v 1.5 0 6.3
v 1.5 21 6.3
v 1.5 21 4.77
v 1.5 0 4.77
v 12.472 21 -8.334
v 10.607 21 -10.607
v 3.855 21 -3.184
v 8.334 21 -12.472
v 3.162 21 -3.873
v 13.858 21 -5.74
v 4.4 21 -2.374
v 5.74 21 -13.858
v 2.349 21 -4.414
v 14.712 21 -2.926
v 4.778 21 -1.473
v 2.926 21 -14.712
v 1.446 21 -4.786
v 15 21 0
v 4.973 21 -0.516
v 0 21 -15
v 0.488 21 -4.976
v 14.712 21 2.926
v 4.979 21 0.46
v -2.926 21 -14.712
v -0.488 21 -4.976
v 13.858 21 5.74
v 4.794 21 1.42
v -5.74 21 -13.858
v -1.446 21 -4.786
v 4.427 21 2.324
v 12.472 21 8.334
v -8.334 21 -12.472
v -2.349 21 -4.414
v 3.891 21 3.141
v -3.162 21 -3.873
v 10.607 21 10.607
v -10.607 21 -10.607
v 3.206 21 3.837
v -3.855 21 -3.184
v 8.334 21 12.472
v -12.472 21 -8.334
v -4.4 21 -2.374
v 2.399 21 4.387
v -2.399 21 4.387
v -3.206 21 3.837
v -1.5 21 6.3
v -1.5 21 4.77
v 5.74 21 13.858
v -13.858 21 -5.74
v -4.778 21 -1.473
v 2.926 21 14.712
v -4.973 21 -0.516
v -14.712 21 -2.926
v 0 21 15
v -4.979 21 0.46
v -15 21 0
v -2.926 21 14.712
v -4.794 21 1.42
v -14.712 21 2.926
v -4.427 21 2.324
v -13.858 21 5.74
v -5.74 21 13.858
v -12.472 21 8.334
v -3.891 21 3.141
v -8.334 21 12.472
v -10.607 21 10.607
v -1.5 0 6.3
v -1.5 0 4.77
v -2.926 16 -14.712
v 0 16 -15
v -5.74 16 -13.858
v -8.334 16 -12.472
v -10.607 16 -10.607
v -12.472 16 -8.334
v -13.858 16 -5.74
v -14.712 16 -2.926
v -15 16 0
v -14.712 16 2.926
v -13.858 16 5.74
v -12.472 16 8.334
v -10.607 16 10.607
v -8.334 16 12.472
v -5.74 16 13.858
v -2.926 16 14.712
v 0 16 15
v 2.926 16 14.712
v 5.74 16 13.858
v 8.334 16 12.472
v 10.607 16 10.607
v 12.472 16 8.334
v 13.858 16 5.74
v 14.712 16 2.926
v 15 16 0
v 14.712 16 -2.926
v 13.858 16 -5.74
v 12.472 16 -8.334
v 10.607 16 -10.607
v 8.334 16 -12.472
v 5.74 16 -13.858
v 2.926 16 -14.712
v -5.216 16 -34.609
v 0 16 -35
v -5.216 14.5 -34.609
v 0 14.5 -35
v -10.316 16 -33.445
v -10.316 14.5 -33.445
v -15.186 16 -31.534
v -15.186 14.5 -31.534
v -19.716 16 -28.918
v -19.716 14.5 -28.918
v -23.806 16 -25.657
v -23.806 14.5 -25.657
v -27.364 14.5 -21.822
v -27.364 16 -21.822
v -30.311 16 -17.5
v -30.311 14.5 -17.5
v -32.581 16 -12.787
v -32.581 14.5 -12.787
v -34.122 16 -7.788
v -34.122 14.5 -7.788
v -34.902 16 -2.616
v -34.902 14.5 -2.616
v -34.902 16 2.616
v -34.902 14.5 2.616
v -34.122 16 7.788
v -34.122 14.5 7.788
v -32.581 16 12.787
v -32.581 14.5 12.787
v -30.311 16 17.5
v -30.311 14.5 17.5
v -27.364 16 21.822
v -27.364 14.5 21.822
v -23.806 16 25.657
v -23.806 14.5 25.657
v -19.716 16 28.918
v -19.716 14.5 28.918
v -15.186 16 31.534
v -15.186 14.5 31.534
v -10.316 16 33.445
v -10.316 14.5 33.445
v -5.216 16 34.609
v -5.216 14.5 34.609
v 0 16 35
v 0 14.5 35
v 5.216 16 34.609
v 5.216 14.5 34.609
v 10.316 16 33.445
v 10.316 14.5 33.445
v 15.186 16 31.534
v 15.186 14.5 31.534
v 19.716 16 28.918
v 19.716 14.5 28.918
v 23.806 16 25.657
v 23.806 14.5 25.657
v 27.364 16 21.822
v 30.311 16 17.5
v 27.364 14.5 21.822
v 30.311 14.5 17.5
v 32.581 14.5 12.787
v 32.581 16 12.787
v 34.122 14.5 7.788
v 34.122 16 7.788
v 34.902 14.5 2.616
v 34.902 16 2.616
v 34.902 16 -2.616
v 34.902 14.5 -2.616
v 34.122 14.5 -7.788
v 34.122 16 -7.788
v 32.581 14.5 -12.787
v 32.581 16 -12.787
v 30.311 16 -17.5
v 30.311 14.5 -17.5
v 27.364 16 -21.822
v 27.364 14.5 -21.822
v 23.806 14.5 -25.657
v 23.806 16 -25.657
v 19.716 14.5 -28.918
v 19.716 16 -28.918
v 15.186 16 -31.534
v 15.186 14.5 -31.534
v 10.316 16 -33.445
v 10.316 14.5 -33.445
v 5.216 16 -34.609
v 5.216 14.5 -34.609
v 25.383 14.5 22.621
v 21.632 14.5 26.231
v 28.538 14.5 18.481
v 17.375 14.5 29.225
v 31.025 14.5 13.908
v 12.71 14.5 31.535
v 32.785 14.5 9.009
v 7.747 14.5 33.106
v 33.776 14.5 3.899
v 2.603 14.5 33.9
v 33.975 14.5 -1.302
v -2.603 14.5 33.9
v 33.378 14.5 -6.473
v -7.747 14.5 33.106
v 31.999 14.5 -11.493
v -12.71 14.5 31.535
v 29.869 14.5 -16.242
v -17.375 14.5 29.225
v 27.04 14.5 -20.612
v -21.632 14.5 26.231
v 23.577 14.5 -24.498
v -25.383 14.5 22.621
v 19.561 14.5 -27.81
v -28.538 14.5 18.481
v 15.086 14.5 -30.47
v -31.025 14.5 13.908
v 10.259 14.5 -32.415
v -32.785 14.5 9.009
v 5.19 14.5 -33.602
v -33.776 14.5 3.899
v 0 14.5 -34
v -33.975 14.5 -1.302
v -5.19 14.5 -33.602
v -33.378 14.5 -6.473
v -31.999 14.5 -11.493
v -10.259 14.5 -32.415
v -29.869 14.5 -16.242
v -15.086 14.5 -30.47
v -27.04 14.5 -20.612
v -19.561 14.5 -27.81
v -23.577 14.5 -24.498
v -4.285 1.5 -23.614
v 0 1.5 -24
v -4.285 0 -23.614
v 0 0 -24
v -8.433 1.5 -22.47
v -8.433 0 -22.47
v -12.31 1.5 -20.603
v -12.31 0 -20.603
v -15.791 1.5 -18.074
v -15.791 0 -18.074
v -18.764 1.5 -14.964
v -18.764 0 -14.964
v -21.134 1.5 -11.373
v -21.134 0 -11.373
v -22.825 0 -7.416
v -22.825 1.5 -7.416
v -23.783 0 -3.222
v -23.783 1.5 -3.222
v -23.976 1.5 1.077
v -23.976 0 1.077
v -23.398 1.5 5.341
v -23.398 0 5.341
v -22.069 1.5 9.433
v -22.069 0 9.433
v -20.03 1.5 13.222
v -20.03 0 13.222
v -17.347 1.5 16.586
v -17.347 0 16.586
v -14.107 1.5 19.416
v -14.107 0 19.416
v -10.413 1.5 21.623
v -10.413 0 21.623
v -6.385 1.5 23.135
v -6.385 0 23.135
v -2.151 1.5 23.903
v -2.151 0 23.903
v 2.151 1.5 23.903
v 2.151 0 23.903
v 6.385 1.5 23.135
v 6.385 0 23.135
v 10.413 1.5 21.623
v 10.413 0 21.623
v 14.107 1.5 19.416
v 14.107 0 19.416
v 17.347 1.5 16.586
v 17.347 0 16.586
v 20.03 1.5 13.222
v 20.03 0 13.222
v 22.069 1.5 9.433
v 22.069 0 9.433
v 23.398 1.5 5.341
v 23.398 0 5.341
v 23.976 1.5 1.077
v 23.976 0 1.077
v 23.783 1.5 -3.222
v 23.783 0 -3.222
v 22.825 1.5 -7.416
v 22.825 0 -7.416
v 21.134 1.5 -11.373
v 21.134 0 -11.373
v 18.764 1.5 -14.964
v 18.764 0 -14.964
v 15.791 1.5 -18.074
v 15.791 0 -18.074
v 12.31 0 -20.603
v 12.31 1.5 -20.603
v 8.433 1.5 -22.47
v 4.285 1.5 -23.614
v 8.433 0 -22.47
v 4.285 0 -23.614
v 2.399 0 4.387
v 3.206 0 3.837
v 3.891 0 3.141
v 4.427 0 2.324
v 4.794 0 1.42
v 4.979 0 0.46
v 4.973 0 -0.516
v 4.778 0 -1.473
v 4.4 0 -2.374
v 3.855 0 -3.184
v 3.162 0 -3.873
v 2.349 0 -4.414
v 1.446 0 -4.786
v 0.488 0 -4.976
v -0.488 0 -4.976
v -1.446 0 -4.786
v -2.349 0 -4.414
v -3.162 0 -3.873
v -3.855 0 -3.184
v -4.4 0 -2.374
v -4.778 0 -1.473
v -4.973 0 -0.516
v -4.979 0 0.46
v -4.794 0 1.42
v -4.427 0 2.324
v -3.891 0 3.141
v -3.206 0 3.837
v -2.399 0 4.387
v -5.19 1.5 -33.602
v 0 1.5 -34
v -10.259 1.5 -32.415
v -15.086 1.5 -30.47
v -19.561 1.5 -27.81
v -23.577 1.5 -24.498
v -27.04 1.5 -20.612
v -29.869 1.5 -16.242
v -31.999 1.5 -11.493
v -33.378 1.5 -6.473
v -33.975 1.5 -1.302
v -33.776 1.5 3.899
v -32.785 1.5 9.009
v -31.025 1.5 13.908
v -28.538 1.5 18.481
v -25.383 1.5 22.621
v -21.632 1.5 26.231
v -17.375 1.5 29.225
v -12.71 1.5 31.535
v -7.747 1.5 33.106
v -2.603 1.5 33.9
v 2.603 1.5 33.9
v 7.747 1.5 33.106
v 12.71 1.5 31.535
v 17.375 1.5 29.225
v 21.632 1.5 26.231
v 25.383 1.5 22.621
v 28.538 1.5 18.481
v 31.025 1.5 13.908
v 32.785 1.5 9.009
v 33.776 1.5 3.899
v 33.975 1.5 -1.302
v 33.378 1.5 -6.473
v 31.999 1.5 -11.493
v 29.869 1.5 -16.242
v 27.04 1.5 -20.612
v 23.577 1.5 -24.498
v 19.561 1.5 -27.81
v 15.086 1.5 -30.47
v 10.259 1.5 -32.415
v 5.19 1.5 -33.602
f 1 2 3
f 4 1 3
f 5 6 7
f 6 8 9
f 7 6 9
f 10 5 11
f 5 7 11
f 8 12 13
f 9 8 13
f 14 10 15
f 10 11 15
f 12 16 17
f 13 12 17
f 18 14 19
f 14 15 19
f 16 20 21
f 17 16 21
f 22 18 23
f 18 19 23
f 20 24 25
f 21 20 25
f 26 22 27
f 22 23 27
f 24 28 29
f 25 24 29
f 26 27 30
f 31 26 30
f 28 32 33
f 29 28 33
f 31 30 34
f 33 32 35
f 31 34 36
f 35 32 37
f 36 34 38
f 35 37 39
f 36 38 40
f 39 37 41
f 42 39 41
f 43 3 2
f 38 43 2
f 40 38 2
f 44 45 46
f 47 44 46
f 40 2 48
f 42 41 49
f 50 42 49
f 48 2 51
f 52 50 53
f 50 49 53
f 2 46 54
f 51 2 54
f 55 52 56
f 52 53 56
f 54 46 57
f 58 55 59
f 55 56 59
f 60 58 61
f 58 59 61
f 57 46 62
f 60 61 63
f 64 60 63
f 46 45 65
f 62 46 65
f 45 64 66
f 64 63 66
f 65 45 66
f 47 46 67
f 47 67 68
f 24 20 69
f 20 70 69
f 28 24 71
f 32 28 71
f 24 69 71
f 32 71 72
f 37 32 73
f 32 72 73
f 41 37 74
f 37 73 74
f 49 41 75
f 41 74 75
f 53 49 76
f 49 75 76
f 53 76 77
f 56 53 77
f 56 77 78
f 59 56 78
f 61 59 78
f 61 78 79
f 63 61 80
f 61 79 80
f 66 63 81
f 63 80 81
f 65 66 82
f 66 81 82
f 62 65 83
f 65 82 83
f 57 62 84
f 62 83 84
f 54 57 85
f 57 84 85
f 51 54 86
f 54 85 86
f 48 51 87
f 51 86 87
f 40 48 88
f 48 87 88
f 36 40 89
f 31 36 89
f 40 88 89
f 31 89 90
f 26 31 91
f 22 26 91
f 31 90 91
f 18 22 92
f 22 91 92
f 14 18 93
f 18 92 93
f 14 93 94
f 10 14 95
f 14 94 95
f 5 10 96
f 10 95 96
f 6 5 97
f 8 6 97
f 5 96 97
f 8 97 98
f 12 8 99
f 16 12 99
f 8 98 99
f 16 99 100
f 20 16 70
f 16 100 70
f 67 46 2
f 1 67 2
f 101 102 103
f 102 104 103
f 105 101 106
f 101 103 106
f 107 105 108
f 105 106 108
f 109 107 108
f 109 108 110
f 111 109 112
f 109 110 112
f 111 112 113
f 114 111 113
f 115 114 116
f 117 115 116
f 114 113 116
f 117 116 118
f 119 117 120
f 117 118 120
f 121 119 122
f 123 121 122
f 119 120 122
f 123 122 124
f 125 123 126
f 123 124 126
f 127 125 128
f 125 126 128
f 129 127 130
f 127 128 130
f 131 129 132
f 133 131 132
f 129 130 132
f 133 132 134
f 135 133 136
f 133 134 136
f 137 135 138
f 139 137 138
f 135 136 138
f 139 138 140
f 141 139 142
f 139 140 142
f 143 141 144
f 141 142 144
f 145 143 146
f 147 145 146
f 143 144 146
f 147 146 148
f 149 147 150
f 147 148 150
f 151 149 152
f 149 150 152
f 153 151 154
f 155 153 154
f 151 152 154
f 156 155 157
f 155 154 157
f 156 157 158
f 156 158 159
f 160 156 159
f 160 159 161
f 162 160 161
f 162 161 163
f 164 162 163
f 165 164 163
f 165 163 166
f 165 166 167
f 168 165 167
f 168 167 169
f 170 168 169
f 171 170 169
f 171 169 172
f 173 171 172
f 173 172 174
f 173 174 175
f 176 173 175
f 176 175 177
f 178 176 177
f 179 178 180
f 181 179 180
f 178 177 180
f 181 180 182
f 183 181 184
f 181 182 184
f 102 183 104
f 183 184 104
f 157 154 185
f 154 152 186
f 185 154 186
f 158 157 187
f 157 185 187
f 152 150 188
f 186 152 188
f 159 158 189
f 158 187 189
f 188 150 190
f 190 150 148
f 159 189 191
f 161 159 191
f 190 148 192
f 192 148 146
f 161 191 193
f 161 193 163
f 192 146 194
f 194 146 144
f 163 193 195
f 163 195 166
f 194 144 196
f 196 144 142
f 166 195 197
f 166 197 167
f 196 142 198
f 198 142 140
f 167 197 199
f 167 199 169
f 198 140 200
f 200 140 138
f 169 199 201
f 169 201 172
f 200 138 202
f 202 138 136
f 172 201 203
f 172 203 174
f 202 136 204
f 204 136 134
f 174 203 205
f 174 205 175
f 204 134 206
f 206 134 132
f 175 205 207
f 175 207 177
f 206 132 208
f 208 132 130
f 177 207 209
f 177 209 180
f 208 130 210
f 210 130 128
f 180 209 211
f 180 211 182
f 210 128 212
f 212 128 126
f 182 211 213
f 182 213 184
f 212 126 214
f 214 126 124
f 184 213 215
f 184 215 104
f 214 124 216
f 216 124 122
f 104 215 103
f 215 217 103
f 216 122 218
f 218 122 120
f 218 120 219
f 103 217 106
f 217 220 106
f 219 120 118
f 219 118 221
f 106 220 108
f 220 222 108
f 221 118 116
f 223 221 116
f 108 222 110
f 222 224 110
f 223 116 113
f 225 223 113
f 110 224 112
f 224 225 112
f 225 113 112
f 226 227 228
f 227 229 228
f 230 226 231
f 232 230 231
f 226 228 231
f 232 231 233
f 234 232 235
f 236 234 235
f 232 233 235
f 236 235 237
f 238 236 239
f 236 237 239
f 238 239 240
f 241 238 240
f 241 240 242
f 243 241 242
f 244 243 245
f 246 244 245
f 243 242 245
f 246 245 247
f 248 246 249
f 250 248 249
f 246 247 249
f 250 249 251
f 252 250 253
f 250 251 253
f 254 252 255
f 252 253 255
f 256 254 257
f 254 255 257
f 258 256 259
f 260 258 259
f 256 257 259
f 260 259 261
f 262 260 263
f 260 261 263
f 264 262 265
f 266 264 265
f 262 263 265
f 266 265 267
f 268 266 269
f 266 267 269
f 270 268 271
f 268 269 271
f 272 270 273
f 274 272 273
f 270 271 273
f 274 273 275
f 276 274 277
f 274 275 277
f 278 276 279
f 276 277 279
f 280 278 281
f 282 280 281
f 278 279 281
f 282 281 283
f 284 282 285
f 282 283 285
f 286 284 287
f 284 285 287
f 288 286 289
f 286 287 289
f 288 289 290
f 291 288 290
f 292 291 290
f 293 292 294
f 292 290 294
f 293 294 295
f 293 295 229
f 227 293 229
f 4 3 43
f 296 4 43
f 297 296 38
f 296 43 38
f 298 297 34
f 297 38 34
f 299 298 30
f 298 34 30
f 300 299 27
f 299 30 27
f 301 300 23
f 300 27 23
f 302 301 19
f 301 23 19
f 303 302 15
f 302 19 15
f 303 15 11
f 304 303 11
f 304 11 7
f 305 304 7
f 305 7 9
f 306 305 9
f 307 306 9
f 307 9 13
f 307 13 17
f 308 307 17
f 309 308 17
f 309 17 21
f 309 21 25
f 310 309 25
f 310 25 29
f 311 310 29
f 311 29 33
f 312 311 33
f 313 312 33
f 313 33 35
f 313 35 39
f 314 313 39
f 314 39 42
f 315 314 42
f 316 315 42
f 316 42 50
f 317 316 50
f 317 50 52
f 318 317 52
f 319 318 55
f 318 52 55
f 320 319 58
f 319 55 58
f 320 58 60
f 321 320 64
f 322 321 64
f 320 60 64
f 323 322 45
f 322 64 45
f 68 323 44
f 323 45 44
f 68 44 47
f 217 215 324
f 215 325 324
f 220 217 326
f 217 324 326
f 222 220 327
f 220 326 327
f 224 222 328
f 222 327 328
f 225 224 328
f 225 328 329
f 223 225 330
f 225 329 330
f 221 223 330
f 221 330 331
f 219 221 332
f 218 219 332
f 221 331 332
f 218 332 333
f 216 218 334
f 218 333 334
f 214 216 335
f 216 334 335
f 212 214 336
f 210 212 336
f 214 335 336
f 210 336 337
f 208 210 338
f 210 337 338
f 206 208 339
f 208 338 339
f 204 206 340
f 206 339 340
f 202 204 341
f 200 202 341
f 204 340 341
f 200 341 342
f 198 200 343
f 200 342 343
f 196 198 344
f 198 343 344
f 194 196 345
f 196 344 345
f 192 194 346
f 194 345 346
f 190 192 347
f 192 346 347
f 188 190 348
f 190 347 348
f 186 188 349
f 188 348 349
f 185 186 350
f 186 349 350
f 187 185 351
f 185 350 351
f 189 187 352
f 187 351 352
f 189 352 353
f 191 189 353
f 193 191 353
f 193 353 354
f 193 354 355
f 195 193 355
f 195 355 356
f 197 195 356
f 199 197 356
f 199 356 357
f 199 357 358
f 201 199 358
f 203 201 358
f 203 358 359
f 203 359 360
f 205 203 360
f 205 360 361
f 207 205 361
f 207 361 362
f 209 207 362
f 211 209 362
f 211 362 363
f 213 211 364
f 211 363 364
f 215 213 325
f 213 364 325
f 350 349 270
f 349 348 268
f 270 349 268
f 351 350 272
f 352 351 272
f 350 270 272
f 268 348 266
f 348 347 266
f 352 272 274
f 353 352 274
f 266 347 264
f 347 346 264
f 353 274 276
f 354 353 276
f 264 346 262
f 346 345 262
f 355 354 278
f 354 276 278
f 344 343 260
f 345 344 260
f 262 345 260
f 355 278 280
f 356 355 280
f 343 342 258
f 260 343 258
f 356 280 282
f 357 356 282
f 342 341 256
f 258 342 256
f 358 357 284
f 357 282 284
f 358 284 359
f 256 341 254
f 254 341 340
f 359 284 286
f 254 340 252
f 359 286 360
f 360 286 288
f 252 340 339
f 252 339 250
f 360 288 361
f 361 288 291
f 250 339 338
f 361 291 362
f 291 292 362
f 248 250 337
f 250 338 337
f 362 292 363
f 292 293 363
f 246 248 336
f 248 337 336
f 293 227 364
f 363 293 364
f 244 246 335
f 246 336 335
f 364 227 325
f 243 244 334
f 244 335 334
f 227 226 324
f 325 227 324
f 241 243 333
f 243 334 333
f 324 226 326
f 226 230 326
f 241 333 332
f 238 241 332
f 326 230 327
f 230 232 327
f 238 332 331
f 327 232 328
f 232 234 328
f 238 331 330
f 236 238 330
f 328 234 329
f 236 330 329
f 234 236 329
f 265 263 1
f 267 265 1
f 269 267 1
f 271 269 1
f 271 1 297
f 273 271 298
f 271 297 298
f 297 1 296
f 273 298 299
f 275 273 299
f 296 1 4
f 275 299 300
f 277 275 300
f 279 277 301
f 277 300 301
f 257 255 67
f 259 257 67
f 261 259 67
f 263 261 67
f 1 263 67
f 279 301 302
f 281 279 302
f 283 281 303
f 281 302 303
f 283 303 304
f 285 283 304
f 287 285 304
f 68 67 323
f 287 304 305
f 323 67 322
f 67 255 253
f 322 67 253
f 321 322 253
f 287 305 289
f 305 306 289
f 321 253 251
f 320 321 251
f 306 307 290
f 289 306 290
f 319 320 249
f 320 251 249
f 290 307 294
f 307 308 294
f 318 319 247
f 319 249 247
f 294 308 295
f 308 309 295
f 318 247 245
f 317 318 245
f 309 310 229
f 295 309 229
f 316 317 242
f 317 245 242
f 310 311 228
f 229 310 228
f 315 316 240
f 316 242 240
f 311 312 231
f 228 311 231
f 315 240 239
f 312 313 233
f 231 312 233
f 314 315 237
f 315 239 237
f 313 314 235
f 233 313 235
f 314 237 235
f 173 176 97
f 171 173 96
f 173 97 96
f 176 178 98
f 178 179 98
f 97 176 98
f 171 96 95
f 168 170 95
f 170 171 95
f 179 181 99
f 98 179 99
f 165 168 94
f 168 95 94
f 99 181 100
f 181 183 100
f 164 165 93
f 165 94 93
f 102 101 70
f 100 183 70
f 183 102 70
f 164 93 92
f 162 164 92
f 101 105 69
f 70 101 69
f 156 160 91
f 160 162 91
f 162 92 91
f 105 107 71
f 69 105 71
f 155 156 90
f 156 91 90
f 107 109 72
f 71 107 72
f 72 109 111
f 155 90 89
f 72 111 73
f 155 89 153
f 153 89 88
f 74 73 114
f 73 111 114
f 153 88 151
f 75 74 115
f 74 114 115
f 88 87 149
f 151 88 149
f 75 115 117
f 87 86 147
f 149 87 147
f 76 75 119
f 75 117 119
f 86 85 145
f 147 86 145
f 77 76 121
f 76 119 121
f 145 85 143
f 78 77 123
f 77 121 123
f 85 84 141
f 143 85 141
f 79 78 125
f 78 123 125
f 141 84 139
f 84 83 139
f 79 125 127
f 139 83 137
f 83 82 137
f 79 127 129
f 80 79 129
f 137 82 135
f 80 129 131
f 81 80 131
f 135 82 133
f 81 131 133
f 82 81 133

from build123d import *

# Parameters (mm, degrees)
SKETCH2_R          = 5
CUT_EXTRUDE1_DEPTH = 54.768020235
SKETCH3_W          = 3
SKETCH3_H          = 2
CUT_EXTRUDE2_DEPTH = 54.768020235


with BuildPart() as part:
    # Sketch1 → Revolve2 (revolve)
    with BuildSketch(Plane.XY, mode=Mode.PRIVATE) as revolve2_sk:
        Polygon((34, 14.5), (34, 1.5), (24, 1.5), (24, 0), (0, 0), (0, 21), (15, 21), (15, 16), (35, 16), (35, 14.5), align=None)
    revolve(revolve2_sk.sketch.rotate(Axis((0, 0, 0), (0, 1, 0)), 90), axis=Axis((0, 0, 0), (0, 1, 0)))

    # Sketch2 → Cut-Extrude1 (cut, through all)
    with BuildSketch(Plane(origin=(0, 21, 0), x_dir=(1, 0, 0), z_dir=(0, 1, 0))):
        with Locations(Location((0, 0, 0), (0, 0, 270))):
            Circle(SKETCH2_R)
    extrude(amount=-CUT_EXTRUDE1_DEPTH, mode=Mode.SUBTRACT)

    # Sketch3 → Cut-Extrude2 (cut, through all)
    with BuildSketch(Plane(origin=(0, 21, 0), x_dir=(1, 0, 0), z_dir=(0, 1, 0))):
        with Locations((0, -5.3)):
            Rectangle(SKETCH3_W, SKETCH3_H)
    extrude(amount=-CUT_EXTRUDE2_DEPTH, mode=Mode.SUBTRACT)


solid = part.part
